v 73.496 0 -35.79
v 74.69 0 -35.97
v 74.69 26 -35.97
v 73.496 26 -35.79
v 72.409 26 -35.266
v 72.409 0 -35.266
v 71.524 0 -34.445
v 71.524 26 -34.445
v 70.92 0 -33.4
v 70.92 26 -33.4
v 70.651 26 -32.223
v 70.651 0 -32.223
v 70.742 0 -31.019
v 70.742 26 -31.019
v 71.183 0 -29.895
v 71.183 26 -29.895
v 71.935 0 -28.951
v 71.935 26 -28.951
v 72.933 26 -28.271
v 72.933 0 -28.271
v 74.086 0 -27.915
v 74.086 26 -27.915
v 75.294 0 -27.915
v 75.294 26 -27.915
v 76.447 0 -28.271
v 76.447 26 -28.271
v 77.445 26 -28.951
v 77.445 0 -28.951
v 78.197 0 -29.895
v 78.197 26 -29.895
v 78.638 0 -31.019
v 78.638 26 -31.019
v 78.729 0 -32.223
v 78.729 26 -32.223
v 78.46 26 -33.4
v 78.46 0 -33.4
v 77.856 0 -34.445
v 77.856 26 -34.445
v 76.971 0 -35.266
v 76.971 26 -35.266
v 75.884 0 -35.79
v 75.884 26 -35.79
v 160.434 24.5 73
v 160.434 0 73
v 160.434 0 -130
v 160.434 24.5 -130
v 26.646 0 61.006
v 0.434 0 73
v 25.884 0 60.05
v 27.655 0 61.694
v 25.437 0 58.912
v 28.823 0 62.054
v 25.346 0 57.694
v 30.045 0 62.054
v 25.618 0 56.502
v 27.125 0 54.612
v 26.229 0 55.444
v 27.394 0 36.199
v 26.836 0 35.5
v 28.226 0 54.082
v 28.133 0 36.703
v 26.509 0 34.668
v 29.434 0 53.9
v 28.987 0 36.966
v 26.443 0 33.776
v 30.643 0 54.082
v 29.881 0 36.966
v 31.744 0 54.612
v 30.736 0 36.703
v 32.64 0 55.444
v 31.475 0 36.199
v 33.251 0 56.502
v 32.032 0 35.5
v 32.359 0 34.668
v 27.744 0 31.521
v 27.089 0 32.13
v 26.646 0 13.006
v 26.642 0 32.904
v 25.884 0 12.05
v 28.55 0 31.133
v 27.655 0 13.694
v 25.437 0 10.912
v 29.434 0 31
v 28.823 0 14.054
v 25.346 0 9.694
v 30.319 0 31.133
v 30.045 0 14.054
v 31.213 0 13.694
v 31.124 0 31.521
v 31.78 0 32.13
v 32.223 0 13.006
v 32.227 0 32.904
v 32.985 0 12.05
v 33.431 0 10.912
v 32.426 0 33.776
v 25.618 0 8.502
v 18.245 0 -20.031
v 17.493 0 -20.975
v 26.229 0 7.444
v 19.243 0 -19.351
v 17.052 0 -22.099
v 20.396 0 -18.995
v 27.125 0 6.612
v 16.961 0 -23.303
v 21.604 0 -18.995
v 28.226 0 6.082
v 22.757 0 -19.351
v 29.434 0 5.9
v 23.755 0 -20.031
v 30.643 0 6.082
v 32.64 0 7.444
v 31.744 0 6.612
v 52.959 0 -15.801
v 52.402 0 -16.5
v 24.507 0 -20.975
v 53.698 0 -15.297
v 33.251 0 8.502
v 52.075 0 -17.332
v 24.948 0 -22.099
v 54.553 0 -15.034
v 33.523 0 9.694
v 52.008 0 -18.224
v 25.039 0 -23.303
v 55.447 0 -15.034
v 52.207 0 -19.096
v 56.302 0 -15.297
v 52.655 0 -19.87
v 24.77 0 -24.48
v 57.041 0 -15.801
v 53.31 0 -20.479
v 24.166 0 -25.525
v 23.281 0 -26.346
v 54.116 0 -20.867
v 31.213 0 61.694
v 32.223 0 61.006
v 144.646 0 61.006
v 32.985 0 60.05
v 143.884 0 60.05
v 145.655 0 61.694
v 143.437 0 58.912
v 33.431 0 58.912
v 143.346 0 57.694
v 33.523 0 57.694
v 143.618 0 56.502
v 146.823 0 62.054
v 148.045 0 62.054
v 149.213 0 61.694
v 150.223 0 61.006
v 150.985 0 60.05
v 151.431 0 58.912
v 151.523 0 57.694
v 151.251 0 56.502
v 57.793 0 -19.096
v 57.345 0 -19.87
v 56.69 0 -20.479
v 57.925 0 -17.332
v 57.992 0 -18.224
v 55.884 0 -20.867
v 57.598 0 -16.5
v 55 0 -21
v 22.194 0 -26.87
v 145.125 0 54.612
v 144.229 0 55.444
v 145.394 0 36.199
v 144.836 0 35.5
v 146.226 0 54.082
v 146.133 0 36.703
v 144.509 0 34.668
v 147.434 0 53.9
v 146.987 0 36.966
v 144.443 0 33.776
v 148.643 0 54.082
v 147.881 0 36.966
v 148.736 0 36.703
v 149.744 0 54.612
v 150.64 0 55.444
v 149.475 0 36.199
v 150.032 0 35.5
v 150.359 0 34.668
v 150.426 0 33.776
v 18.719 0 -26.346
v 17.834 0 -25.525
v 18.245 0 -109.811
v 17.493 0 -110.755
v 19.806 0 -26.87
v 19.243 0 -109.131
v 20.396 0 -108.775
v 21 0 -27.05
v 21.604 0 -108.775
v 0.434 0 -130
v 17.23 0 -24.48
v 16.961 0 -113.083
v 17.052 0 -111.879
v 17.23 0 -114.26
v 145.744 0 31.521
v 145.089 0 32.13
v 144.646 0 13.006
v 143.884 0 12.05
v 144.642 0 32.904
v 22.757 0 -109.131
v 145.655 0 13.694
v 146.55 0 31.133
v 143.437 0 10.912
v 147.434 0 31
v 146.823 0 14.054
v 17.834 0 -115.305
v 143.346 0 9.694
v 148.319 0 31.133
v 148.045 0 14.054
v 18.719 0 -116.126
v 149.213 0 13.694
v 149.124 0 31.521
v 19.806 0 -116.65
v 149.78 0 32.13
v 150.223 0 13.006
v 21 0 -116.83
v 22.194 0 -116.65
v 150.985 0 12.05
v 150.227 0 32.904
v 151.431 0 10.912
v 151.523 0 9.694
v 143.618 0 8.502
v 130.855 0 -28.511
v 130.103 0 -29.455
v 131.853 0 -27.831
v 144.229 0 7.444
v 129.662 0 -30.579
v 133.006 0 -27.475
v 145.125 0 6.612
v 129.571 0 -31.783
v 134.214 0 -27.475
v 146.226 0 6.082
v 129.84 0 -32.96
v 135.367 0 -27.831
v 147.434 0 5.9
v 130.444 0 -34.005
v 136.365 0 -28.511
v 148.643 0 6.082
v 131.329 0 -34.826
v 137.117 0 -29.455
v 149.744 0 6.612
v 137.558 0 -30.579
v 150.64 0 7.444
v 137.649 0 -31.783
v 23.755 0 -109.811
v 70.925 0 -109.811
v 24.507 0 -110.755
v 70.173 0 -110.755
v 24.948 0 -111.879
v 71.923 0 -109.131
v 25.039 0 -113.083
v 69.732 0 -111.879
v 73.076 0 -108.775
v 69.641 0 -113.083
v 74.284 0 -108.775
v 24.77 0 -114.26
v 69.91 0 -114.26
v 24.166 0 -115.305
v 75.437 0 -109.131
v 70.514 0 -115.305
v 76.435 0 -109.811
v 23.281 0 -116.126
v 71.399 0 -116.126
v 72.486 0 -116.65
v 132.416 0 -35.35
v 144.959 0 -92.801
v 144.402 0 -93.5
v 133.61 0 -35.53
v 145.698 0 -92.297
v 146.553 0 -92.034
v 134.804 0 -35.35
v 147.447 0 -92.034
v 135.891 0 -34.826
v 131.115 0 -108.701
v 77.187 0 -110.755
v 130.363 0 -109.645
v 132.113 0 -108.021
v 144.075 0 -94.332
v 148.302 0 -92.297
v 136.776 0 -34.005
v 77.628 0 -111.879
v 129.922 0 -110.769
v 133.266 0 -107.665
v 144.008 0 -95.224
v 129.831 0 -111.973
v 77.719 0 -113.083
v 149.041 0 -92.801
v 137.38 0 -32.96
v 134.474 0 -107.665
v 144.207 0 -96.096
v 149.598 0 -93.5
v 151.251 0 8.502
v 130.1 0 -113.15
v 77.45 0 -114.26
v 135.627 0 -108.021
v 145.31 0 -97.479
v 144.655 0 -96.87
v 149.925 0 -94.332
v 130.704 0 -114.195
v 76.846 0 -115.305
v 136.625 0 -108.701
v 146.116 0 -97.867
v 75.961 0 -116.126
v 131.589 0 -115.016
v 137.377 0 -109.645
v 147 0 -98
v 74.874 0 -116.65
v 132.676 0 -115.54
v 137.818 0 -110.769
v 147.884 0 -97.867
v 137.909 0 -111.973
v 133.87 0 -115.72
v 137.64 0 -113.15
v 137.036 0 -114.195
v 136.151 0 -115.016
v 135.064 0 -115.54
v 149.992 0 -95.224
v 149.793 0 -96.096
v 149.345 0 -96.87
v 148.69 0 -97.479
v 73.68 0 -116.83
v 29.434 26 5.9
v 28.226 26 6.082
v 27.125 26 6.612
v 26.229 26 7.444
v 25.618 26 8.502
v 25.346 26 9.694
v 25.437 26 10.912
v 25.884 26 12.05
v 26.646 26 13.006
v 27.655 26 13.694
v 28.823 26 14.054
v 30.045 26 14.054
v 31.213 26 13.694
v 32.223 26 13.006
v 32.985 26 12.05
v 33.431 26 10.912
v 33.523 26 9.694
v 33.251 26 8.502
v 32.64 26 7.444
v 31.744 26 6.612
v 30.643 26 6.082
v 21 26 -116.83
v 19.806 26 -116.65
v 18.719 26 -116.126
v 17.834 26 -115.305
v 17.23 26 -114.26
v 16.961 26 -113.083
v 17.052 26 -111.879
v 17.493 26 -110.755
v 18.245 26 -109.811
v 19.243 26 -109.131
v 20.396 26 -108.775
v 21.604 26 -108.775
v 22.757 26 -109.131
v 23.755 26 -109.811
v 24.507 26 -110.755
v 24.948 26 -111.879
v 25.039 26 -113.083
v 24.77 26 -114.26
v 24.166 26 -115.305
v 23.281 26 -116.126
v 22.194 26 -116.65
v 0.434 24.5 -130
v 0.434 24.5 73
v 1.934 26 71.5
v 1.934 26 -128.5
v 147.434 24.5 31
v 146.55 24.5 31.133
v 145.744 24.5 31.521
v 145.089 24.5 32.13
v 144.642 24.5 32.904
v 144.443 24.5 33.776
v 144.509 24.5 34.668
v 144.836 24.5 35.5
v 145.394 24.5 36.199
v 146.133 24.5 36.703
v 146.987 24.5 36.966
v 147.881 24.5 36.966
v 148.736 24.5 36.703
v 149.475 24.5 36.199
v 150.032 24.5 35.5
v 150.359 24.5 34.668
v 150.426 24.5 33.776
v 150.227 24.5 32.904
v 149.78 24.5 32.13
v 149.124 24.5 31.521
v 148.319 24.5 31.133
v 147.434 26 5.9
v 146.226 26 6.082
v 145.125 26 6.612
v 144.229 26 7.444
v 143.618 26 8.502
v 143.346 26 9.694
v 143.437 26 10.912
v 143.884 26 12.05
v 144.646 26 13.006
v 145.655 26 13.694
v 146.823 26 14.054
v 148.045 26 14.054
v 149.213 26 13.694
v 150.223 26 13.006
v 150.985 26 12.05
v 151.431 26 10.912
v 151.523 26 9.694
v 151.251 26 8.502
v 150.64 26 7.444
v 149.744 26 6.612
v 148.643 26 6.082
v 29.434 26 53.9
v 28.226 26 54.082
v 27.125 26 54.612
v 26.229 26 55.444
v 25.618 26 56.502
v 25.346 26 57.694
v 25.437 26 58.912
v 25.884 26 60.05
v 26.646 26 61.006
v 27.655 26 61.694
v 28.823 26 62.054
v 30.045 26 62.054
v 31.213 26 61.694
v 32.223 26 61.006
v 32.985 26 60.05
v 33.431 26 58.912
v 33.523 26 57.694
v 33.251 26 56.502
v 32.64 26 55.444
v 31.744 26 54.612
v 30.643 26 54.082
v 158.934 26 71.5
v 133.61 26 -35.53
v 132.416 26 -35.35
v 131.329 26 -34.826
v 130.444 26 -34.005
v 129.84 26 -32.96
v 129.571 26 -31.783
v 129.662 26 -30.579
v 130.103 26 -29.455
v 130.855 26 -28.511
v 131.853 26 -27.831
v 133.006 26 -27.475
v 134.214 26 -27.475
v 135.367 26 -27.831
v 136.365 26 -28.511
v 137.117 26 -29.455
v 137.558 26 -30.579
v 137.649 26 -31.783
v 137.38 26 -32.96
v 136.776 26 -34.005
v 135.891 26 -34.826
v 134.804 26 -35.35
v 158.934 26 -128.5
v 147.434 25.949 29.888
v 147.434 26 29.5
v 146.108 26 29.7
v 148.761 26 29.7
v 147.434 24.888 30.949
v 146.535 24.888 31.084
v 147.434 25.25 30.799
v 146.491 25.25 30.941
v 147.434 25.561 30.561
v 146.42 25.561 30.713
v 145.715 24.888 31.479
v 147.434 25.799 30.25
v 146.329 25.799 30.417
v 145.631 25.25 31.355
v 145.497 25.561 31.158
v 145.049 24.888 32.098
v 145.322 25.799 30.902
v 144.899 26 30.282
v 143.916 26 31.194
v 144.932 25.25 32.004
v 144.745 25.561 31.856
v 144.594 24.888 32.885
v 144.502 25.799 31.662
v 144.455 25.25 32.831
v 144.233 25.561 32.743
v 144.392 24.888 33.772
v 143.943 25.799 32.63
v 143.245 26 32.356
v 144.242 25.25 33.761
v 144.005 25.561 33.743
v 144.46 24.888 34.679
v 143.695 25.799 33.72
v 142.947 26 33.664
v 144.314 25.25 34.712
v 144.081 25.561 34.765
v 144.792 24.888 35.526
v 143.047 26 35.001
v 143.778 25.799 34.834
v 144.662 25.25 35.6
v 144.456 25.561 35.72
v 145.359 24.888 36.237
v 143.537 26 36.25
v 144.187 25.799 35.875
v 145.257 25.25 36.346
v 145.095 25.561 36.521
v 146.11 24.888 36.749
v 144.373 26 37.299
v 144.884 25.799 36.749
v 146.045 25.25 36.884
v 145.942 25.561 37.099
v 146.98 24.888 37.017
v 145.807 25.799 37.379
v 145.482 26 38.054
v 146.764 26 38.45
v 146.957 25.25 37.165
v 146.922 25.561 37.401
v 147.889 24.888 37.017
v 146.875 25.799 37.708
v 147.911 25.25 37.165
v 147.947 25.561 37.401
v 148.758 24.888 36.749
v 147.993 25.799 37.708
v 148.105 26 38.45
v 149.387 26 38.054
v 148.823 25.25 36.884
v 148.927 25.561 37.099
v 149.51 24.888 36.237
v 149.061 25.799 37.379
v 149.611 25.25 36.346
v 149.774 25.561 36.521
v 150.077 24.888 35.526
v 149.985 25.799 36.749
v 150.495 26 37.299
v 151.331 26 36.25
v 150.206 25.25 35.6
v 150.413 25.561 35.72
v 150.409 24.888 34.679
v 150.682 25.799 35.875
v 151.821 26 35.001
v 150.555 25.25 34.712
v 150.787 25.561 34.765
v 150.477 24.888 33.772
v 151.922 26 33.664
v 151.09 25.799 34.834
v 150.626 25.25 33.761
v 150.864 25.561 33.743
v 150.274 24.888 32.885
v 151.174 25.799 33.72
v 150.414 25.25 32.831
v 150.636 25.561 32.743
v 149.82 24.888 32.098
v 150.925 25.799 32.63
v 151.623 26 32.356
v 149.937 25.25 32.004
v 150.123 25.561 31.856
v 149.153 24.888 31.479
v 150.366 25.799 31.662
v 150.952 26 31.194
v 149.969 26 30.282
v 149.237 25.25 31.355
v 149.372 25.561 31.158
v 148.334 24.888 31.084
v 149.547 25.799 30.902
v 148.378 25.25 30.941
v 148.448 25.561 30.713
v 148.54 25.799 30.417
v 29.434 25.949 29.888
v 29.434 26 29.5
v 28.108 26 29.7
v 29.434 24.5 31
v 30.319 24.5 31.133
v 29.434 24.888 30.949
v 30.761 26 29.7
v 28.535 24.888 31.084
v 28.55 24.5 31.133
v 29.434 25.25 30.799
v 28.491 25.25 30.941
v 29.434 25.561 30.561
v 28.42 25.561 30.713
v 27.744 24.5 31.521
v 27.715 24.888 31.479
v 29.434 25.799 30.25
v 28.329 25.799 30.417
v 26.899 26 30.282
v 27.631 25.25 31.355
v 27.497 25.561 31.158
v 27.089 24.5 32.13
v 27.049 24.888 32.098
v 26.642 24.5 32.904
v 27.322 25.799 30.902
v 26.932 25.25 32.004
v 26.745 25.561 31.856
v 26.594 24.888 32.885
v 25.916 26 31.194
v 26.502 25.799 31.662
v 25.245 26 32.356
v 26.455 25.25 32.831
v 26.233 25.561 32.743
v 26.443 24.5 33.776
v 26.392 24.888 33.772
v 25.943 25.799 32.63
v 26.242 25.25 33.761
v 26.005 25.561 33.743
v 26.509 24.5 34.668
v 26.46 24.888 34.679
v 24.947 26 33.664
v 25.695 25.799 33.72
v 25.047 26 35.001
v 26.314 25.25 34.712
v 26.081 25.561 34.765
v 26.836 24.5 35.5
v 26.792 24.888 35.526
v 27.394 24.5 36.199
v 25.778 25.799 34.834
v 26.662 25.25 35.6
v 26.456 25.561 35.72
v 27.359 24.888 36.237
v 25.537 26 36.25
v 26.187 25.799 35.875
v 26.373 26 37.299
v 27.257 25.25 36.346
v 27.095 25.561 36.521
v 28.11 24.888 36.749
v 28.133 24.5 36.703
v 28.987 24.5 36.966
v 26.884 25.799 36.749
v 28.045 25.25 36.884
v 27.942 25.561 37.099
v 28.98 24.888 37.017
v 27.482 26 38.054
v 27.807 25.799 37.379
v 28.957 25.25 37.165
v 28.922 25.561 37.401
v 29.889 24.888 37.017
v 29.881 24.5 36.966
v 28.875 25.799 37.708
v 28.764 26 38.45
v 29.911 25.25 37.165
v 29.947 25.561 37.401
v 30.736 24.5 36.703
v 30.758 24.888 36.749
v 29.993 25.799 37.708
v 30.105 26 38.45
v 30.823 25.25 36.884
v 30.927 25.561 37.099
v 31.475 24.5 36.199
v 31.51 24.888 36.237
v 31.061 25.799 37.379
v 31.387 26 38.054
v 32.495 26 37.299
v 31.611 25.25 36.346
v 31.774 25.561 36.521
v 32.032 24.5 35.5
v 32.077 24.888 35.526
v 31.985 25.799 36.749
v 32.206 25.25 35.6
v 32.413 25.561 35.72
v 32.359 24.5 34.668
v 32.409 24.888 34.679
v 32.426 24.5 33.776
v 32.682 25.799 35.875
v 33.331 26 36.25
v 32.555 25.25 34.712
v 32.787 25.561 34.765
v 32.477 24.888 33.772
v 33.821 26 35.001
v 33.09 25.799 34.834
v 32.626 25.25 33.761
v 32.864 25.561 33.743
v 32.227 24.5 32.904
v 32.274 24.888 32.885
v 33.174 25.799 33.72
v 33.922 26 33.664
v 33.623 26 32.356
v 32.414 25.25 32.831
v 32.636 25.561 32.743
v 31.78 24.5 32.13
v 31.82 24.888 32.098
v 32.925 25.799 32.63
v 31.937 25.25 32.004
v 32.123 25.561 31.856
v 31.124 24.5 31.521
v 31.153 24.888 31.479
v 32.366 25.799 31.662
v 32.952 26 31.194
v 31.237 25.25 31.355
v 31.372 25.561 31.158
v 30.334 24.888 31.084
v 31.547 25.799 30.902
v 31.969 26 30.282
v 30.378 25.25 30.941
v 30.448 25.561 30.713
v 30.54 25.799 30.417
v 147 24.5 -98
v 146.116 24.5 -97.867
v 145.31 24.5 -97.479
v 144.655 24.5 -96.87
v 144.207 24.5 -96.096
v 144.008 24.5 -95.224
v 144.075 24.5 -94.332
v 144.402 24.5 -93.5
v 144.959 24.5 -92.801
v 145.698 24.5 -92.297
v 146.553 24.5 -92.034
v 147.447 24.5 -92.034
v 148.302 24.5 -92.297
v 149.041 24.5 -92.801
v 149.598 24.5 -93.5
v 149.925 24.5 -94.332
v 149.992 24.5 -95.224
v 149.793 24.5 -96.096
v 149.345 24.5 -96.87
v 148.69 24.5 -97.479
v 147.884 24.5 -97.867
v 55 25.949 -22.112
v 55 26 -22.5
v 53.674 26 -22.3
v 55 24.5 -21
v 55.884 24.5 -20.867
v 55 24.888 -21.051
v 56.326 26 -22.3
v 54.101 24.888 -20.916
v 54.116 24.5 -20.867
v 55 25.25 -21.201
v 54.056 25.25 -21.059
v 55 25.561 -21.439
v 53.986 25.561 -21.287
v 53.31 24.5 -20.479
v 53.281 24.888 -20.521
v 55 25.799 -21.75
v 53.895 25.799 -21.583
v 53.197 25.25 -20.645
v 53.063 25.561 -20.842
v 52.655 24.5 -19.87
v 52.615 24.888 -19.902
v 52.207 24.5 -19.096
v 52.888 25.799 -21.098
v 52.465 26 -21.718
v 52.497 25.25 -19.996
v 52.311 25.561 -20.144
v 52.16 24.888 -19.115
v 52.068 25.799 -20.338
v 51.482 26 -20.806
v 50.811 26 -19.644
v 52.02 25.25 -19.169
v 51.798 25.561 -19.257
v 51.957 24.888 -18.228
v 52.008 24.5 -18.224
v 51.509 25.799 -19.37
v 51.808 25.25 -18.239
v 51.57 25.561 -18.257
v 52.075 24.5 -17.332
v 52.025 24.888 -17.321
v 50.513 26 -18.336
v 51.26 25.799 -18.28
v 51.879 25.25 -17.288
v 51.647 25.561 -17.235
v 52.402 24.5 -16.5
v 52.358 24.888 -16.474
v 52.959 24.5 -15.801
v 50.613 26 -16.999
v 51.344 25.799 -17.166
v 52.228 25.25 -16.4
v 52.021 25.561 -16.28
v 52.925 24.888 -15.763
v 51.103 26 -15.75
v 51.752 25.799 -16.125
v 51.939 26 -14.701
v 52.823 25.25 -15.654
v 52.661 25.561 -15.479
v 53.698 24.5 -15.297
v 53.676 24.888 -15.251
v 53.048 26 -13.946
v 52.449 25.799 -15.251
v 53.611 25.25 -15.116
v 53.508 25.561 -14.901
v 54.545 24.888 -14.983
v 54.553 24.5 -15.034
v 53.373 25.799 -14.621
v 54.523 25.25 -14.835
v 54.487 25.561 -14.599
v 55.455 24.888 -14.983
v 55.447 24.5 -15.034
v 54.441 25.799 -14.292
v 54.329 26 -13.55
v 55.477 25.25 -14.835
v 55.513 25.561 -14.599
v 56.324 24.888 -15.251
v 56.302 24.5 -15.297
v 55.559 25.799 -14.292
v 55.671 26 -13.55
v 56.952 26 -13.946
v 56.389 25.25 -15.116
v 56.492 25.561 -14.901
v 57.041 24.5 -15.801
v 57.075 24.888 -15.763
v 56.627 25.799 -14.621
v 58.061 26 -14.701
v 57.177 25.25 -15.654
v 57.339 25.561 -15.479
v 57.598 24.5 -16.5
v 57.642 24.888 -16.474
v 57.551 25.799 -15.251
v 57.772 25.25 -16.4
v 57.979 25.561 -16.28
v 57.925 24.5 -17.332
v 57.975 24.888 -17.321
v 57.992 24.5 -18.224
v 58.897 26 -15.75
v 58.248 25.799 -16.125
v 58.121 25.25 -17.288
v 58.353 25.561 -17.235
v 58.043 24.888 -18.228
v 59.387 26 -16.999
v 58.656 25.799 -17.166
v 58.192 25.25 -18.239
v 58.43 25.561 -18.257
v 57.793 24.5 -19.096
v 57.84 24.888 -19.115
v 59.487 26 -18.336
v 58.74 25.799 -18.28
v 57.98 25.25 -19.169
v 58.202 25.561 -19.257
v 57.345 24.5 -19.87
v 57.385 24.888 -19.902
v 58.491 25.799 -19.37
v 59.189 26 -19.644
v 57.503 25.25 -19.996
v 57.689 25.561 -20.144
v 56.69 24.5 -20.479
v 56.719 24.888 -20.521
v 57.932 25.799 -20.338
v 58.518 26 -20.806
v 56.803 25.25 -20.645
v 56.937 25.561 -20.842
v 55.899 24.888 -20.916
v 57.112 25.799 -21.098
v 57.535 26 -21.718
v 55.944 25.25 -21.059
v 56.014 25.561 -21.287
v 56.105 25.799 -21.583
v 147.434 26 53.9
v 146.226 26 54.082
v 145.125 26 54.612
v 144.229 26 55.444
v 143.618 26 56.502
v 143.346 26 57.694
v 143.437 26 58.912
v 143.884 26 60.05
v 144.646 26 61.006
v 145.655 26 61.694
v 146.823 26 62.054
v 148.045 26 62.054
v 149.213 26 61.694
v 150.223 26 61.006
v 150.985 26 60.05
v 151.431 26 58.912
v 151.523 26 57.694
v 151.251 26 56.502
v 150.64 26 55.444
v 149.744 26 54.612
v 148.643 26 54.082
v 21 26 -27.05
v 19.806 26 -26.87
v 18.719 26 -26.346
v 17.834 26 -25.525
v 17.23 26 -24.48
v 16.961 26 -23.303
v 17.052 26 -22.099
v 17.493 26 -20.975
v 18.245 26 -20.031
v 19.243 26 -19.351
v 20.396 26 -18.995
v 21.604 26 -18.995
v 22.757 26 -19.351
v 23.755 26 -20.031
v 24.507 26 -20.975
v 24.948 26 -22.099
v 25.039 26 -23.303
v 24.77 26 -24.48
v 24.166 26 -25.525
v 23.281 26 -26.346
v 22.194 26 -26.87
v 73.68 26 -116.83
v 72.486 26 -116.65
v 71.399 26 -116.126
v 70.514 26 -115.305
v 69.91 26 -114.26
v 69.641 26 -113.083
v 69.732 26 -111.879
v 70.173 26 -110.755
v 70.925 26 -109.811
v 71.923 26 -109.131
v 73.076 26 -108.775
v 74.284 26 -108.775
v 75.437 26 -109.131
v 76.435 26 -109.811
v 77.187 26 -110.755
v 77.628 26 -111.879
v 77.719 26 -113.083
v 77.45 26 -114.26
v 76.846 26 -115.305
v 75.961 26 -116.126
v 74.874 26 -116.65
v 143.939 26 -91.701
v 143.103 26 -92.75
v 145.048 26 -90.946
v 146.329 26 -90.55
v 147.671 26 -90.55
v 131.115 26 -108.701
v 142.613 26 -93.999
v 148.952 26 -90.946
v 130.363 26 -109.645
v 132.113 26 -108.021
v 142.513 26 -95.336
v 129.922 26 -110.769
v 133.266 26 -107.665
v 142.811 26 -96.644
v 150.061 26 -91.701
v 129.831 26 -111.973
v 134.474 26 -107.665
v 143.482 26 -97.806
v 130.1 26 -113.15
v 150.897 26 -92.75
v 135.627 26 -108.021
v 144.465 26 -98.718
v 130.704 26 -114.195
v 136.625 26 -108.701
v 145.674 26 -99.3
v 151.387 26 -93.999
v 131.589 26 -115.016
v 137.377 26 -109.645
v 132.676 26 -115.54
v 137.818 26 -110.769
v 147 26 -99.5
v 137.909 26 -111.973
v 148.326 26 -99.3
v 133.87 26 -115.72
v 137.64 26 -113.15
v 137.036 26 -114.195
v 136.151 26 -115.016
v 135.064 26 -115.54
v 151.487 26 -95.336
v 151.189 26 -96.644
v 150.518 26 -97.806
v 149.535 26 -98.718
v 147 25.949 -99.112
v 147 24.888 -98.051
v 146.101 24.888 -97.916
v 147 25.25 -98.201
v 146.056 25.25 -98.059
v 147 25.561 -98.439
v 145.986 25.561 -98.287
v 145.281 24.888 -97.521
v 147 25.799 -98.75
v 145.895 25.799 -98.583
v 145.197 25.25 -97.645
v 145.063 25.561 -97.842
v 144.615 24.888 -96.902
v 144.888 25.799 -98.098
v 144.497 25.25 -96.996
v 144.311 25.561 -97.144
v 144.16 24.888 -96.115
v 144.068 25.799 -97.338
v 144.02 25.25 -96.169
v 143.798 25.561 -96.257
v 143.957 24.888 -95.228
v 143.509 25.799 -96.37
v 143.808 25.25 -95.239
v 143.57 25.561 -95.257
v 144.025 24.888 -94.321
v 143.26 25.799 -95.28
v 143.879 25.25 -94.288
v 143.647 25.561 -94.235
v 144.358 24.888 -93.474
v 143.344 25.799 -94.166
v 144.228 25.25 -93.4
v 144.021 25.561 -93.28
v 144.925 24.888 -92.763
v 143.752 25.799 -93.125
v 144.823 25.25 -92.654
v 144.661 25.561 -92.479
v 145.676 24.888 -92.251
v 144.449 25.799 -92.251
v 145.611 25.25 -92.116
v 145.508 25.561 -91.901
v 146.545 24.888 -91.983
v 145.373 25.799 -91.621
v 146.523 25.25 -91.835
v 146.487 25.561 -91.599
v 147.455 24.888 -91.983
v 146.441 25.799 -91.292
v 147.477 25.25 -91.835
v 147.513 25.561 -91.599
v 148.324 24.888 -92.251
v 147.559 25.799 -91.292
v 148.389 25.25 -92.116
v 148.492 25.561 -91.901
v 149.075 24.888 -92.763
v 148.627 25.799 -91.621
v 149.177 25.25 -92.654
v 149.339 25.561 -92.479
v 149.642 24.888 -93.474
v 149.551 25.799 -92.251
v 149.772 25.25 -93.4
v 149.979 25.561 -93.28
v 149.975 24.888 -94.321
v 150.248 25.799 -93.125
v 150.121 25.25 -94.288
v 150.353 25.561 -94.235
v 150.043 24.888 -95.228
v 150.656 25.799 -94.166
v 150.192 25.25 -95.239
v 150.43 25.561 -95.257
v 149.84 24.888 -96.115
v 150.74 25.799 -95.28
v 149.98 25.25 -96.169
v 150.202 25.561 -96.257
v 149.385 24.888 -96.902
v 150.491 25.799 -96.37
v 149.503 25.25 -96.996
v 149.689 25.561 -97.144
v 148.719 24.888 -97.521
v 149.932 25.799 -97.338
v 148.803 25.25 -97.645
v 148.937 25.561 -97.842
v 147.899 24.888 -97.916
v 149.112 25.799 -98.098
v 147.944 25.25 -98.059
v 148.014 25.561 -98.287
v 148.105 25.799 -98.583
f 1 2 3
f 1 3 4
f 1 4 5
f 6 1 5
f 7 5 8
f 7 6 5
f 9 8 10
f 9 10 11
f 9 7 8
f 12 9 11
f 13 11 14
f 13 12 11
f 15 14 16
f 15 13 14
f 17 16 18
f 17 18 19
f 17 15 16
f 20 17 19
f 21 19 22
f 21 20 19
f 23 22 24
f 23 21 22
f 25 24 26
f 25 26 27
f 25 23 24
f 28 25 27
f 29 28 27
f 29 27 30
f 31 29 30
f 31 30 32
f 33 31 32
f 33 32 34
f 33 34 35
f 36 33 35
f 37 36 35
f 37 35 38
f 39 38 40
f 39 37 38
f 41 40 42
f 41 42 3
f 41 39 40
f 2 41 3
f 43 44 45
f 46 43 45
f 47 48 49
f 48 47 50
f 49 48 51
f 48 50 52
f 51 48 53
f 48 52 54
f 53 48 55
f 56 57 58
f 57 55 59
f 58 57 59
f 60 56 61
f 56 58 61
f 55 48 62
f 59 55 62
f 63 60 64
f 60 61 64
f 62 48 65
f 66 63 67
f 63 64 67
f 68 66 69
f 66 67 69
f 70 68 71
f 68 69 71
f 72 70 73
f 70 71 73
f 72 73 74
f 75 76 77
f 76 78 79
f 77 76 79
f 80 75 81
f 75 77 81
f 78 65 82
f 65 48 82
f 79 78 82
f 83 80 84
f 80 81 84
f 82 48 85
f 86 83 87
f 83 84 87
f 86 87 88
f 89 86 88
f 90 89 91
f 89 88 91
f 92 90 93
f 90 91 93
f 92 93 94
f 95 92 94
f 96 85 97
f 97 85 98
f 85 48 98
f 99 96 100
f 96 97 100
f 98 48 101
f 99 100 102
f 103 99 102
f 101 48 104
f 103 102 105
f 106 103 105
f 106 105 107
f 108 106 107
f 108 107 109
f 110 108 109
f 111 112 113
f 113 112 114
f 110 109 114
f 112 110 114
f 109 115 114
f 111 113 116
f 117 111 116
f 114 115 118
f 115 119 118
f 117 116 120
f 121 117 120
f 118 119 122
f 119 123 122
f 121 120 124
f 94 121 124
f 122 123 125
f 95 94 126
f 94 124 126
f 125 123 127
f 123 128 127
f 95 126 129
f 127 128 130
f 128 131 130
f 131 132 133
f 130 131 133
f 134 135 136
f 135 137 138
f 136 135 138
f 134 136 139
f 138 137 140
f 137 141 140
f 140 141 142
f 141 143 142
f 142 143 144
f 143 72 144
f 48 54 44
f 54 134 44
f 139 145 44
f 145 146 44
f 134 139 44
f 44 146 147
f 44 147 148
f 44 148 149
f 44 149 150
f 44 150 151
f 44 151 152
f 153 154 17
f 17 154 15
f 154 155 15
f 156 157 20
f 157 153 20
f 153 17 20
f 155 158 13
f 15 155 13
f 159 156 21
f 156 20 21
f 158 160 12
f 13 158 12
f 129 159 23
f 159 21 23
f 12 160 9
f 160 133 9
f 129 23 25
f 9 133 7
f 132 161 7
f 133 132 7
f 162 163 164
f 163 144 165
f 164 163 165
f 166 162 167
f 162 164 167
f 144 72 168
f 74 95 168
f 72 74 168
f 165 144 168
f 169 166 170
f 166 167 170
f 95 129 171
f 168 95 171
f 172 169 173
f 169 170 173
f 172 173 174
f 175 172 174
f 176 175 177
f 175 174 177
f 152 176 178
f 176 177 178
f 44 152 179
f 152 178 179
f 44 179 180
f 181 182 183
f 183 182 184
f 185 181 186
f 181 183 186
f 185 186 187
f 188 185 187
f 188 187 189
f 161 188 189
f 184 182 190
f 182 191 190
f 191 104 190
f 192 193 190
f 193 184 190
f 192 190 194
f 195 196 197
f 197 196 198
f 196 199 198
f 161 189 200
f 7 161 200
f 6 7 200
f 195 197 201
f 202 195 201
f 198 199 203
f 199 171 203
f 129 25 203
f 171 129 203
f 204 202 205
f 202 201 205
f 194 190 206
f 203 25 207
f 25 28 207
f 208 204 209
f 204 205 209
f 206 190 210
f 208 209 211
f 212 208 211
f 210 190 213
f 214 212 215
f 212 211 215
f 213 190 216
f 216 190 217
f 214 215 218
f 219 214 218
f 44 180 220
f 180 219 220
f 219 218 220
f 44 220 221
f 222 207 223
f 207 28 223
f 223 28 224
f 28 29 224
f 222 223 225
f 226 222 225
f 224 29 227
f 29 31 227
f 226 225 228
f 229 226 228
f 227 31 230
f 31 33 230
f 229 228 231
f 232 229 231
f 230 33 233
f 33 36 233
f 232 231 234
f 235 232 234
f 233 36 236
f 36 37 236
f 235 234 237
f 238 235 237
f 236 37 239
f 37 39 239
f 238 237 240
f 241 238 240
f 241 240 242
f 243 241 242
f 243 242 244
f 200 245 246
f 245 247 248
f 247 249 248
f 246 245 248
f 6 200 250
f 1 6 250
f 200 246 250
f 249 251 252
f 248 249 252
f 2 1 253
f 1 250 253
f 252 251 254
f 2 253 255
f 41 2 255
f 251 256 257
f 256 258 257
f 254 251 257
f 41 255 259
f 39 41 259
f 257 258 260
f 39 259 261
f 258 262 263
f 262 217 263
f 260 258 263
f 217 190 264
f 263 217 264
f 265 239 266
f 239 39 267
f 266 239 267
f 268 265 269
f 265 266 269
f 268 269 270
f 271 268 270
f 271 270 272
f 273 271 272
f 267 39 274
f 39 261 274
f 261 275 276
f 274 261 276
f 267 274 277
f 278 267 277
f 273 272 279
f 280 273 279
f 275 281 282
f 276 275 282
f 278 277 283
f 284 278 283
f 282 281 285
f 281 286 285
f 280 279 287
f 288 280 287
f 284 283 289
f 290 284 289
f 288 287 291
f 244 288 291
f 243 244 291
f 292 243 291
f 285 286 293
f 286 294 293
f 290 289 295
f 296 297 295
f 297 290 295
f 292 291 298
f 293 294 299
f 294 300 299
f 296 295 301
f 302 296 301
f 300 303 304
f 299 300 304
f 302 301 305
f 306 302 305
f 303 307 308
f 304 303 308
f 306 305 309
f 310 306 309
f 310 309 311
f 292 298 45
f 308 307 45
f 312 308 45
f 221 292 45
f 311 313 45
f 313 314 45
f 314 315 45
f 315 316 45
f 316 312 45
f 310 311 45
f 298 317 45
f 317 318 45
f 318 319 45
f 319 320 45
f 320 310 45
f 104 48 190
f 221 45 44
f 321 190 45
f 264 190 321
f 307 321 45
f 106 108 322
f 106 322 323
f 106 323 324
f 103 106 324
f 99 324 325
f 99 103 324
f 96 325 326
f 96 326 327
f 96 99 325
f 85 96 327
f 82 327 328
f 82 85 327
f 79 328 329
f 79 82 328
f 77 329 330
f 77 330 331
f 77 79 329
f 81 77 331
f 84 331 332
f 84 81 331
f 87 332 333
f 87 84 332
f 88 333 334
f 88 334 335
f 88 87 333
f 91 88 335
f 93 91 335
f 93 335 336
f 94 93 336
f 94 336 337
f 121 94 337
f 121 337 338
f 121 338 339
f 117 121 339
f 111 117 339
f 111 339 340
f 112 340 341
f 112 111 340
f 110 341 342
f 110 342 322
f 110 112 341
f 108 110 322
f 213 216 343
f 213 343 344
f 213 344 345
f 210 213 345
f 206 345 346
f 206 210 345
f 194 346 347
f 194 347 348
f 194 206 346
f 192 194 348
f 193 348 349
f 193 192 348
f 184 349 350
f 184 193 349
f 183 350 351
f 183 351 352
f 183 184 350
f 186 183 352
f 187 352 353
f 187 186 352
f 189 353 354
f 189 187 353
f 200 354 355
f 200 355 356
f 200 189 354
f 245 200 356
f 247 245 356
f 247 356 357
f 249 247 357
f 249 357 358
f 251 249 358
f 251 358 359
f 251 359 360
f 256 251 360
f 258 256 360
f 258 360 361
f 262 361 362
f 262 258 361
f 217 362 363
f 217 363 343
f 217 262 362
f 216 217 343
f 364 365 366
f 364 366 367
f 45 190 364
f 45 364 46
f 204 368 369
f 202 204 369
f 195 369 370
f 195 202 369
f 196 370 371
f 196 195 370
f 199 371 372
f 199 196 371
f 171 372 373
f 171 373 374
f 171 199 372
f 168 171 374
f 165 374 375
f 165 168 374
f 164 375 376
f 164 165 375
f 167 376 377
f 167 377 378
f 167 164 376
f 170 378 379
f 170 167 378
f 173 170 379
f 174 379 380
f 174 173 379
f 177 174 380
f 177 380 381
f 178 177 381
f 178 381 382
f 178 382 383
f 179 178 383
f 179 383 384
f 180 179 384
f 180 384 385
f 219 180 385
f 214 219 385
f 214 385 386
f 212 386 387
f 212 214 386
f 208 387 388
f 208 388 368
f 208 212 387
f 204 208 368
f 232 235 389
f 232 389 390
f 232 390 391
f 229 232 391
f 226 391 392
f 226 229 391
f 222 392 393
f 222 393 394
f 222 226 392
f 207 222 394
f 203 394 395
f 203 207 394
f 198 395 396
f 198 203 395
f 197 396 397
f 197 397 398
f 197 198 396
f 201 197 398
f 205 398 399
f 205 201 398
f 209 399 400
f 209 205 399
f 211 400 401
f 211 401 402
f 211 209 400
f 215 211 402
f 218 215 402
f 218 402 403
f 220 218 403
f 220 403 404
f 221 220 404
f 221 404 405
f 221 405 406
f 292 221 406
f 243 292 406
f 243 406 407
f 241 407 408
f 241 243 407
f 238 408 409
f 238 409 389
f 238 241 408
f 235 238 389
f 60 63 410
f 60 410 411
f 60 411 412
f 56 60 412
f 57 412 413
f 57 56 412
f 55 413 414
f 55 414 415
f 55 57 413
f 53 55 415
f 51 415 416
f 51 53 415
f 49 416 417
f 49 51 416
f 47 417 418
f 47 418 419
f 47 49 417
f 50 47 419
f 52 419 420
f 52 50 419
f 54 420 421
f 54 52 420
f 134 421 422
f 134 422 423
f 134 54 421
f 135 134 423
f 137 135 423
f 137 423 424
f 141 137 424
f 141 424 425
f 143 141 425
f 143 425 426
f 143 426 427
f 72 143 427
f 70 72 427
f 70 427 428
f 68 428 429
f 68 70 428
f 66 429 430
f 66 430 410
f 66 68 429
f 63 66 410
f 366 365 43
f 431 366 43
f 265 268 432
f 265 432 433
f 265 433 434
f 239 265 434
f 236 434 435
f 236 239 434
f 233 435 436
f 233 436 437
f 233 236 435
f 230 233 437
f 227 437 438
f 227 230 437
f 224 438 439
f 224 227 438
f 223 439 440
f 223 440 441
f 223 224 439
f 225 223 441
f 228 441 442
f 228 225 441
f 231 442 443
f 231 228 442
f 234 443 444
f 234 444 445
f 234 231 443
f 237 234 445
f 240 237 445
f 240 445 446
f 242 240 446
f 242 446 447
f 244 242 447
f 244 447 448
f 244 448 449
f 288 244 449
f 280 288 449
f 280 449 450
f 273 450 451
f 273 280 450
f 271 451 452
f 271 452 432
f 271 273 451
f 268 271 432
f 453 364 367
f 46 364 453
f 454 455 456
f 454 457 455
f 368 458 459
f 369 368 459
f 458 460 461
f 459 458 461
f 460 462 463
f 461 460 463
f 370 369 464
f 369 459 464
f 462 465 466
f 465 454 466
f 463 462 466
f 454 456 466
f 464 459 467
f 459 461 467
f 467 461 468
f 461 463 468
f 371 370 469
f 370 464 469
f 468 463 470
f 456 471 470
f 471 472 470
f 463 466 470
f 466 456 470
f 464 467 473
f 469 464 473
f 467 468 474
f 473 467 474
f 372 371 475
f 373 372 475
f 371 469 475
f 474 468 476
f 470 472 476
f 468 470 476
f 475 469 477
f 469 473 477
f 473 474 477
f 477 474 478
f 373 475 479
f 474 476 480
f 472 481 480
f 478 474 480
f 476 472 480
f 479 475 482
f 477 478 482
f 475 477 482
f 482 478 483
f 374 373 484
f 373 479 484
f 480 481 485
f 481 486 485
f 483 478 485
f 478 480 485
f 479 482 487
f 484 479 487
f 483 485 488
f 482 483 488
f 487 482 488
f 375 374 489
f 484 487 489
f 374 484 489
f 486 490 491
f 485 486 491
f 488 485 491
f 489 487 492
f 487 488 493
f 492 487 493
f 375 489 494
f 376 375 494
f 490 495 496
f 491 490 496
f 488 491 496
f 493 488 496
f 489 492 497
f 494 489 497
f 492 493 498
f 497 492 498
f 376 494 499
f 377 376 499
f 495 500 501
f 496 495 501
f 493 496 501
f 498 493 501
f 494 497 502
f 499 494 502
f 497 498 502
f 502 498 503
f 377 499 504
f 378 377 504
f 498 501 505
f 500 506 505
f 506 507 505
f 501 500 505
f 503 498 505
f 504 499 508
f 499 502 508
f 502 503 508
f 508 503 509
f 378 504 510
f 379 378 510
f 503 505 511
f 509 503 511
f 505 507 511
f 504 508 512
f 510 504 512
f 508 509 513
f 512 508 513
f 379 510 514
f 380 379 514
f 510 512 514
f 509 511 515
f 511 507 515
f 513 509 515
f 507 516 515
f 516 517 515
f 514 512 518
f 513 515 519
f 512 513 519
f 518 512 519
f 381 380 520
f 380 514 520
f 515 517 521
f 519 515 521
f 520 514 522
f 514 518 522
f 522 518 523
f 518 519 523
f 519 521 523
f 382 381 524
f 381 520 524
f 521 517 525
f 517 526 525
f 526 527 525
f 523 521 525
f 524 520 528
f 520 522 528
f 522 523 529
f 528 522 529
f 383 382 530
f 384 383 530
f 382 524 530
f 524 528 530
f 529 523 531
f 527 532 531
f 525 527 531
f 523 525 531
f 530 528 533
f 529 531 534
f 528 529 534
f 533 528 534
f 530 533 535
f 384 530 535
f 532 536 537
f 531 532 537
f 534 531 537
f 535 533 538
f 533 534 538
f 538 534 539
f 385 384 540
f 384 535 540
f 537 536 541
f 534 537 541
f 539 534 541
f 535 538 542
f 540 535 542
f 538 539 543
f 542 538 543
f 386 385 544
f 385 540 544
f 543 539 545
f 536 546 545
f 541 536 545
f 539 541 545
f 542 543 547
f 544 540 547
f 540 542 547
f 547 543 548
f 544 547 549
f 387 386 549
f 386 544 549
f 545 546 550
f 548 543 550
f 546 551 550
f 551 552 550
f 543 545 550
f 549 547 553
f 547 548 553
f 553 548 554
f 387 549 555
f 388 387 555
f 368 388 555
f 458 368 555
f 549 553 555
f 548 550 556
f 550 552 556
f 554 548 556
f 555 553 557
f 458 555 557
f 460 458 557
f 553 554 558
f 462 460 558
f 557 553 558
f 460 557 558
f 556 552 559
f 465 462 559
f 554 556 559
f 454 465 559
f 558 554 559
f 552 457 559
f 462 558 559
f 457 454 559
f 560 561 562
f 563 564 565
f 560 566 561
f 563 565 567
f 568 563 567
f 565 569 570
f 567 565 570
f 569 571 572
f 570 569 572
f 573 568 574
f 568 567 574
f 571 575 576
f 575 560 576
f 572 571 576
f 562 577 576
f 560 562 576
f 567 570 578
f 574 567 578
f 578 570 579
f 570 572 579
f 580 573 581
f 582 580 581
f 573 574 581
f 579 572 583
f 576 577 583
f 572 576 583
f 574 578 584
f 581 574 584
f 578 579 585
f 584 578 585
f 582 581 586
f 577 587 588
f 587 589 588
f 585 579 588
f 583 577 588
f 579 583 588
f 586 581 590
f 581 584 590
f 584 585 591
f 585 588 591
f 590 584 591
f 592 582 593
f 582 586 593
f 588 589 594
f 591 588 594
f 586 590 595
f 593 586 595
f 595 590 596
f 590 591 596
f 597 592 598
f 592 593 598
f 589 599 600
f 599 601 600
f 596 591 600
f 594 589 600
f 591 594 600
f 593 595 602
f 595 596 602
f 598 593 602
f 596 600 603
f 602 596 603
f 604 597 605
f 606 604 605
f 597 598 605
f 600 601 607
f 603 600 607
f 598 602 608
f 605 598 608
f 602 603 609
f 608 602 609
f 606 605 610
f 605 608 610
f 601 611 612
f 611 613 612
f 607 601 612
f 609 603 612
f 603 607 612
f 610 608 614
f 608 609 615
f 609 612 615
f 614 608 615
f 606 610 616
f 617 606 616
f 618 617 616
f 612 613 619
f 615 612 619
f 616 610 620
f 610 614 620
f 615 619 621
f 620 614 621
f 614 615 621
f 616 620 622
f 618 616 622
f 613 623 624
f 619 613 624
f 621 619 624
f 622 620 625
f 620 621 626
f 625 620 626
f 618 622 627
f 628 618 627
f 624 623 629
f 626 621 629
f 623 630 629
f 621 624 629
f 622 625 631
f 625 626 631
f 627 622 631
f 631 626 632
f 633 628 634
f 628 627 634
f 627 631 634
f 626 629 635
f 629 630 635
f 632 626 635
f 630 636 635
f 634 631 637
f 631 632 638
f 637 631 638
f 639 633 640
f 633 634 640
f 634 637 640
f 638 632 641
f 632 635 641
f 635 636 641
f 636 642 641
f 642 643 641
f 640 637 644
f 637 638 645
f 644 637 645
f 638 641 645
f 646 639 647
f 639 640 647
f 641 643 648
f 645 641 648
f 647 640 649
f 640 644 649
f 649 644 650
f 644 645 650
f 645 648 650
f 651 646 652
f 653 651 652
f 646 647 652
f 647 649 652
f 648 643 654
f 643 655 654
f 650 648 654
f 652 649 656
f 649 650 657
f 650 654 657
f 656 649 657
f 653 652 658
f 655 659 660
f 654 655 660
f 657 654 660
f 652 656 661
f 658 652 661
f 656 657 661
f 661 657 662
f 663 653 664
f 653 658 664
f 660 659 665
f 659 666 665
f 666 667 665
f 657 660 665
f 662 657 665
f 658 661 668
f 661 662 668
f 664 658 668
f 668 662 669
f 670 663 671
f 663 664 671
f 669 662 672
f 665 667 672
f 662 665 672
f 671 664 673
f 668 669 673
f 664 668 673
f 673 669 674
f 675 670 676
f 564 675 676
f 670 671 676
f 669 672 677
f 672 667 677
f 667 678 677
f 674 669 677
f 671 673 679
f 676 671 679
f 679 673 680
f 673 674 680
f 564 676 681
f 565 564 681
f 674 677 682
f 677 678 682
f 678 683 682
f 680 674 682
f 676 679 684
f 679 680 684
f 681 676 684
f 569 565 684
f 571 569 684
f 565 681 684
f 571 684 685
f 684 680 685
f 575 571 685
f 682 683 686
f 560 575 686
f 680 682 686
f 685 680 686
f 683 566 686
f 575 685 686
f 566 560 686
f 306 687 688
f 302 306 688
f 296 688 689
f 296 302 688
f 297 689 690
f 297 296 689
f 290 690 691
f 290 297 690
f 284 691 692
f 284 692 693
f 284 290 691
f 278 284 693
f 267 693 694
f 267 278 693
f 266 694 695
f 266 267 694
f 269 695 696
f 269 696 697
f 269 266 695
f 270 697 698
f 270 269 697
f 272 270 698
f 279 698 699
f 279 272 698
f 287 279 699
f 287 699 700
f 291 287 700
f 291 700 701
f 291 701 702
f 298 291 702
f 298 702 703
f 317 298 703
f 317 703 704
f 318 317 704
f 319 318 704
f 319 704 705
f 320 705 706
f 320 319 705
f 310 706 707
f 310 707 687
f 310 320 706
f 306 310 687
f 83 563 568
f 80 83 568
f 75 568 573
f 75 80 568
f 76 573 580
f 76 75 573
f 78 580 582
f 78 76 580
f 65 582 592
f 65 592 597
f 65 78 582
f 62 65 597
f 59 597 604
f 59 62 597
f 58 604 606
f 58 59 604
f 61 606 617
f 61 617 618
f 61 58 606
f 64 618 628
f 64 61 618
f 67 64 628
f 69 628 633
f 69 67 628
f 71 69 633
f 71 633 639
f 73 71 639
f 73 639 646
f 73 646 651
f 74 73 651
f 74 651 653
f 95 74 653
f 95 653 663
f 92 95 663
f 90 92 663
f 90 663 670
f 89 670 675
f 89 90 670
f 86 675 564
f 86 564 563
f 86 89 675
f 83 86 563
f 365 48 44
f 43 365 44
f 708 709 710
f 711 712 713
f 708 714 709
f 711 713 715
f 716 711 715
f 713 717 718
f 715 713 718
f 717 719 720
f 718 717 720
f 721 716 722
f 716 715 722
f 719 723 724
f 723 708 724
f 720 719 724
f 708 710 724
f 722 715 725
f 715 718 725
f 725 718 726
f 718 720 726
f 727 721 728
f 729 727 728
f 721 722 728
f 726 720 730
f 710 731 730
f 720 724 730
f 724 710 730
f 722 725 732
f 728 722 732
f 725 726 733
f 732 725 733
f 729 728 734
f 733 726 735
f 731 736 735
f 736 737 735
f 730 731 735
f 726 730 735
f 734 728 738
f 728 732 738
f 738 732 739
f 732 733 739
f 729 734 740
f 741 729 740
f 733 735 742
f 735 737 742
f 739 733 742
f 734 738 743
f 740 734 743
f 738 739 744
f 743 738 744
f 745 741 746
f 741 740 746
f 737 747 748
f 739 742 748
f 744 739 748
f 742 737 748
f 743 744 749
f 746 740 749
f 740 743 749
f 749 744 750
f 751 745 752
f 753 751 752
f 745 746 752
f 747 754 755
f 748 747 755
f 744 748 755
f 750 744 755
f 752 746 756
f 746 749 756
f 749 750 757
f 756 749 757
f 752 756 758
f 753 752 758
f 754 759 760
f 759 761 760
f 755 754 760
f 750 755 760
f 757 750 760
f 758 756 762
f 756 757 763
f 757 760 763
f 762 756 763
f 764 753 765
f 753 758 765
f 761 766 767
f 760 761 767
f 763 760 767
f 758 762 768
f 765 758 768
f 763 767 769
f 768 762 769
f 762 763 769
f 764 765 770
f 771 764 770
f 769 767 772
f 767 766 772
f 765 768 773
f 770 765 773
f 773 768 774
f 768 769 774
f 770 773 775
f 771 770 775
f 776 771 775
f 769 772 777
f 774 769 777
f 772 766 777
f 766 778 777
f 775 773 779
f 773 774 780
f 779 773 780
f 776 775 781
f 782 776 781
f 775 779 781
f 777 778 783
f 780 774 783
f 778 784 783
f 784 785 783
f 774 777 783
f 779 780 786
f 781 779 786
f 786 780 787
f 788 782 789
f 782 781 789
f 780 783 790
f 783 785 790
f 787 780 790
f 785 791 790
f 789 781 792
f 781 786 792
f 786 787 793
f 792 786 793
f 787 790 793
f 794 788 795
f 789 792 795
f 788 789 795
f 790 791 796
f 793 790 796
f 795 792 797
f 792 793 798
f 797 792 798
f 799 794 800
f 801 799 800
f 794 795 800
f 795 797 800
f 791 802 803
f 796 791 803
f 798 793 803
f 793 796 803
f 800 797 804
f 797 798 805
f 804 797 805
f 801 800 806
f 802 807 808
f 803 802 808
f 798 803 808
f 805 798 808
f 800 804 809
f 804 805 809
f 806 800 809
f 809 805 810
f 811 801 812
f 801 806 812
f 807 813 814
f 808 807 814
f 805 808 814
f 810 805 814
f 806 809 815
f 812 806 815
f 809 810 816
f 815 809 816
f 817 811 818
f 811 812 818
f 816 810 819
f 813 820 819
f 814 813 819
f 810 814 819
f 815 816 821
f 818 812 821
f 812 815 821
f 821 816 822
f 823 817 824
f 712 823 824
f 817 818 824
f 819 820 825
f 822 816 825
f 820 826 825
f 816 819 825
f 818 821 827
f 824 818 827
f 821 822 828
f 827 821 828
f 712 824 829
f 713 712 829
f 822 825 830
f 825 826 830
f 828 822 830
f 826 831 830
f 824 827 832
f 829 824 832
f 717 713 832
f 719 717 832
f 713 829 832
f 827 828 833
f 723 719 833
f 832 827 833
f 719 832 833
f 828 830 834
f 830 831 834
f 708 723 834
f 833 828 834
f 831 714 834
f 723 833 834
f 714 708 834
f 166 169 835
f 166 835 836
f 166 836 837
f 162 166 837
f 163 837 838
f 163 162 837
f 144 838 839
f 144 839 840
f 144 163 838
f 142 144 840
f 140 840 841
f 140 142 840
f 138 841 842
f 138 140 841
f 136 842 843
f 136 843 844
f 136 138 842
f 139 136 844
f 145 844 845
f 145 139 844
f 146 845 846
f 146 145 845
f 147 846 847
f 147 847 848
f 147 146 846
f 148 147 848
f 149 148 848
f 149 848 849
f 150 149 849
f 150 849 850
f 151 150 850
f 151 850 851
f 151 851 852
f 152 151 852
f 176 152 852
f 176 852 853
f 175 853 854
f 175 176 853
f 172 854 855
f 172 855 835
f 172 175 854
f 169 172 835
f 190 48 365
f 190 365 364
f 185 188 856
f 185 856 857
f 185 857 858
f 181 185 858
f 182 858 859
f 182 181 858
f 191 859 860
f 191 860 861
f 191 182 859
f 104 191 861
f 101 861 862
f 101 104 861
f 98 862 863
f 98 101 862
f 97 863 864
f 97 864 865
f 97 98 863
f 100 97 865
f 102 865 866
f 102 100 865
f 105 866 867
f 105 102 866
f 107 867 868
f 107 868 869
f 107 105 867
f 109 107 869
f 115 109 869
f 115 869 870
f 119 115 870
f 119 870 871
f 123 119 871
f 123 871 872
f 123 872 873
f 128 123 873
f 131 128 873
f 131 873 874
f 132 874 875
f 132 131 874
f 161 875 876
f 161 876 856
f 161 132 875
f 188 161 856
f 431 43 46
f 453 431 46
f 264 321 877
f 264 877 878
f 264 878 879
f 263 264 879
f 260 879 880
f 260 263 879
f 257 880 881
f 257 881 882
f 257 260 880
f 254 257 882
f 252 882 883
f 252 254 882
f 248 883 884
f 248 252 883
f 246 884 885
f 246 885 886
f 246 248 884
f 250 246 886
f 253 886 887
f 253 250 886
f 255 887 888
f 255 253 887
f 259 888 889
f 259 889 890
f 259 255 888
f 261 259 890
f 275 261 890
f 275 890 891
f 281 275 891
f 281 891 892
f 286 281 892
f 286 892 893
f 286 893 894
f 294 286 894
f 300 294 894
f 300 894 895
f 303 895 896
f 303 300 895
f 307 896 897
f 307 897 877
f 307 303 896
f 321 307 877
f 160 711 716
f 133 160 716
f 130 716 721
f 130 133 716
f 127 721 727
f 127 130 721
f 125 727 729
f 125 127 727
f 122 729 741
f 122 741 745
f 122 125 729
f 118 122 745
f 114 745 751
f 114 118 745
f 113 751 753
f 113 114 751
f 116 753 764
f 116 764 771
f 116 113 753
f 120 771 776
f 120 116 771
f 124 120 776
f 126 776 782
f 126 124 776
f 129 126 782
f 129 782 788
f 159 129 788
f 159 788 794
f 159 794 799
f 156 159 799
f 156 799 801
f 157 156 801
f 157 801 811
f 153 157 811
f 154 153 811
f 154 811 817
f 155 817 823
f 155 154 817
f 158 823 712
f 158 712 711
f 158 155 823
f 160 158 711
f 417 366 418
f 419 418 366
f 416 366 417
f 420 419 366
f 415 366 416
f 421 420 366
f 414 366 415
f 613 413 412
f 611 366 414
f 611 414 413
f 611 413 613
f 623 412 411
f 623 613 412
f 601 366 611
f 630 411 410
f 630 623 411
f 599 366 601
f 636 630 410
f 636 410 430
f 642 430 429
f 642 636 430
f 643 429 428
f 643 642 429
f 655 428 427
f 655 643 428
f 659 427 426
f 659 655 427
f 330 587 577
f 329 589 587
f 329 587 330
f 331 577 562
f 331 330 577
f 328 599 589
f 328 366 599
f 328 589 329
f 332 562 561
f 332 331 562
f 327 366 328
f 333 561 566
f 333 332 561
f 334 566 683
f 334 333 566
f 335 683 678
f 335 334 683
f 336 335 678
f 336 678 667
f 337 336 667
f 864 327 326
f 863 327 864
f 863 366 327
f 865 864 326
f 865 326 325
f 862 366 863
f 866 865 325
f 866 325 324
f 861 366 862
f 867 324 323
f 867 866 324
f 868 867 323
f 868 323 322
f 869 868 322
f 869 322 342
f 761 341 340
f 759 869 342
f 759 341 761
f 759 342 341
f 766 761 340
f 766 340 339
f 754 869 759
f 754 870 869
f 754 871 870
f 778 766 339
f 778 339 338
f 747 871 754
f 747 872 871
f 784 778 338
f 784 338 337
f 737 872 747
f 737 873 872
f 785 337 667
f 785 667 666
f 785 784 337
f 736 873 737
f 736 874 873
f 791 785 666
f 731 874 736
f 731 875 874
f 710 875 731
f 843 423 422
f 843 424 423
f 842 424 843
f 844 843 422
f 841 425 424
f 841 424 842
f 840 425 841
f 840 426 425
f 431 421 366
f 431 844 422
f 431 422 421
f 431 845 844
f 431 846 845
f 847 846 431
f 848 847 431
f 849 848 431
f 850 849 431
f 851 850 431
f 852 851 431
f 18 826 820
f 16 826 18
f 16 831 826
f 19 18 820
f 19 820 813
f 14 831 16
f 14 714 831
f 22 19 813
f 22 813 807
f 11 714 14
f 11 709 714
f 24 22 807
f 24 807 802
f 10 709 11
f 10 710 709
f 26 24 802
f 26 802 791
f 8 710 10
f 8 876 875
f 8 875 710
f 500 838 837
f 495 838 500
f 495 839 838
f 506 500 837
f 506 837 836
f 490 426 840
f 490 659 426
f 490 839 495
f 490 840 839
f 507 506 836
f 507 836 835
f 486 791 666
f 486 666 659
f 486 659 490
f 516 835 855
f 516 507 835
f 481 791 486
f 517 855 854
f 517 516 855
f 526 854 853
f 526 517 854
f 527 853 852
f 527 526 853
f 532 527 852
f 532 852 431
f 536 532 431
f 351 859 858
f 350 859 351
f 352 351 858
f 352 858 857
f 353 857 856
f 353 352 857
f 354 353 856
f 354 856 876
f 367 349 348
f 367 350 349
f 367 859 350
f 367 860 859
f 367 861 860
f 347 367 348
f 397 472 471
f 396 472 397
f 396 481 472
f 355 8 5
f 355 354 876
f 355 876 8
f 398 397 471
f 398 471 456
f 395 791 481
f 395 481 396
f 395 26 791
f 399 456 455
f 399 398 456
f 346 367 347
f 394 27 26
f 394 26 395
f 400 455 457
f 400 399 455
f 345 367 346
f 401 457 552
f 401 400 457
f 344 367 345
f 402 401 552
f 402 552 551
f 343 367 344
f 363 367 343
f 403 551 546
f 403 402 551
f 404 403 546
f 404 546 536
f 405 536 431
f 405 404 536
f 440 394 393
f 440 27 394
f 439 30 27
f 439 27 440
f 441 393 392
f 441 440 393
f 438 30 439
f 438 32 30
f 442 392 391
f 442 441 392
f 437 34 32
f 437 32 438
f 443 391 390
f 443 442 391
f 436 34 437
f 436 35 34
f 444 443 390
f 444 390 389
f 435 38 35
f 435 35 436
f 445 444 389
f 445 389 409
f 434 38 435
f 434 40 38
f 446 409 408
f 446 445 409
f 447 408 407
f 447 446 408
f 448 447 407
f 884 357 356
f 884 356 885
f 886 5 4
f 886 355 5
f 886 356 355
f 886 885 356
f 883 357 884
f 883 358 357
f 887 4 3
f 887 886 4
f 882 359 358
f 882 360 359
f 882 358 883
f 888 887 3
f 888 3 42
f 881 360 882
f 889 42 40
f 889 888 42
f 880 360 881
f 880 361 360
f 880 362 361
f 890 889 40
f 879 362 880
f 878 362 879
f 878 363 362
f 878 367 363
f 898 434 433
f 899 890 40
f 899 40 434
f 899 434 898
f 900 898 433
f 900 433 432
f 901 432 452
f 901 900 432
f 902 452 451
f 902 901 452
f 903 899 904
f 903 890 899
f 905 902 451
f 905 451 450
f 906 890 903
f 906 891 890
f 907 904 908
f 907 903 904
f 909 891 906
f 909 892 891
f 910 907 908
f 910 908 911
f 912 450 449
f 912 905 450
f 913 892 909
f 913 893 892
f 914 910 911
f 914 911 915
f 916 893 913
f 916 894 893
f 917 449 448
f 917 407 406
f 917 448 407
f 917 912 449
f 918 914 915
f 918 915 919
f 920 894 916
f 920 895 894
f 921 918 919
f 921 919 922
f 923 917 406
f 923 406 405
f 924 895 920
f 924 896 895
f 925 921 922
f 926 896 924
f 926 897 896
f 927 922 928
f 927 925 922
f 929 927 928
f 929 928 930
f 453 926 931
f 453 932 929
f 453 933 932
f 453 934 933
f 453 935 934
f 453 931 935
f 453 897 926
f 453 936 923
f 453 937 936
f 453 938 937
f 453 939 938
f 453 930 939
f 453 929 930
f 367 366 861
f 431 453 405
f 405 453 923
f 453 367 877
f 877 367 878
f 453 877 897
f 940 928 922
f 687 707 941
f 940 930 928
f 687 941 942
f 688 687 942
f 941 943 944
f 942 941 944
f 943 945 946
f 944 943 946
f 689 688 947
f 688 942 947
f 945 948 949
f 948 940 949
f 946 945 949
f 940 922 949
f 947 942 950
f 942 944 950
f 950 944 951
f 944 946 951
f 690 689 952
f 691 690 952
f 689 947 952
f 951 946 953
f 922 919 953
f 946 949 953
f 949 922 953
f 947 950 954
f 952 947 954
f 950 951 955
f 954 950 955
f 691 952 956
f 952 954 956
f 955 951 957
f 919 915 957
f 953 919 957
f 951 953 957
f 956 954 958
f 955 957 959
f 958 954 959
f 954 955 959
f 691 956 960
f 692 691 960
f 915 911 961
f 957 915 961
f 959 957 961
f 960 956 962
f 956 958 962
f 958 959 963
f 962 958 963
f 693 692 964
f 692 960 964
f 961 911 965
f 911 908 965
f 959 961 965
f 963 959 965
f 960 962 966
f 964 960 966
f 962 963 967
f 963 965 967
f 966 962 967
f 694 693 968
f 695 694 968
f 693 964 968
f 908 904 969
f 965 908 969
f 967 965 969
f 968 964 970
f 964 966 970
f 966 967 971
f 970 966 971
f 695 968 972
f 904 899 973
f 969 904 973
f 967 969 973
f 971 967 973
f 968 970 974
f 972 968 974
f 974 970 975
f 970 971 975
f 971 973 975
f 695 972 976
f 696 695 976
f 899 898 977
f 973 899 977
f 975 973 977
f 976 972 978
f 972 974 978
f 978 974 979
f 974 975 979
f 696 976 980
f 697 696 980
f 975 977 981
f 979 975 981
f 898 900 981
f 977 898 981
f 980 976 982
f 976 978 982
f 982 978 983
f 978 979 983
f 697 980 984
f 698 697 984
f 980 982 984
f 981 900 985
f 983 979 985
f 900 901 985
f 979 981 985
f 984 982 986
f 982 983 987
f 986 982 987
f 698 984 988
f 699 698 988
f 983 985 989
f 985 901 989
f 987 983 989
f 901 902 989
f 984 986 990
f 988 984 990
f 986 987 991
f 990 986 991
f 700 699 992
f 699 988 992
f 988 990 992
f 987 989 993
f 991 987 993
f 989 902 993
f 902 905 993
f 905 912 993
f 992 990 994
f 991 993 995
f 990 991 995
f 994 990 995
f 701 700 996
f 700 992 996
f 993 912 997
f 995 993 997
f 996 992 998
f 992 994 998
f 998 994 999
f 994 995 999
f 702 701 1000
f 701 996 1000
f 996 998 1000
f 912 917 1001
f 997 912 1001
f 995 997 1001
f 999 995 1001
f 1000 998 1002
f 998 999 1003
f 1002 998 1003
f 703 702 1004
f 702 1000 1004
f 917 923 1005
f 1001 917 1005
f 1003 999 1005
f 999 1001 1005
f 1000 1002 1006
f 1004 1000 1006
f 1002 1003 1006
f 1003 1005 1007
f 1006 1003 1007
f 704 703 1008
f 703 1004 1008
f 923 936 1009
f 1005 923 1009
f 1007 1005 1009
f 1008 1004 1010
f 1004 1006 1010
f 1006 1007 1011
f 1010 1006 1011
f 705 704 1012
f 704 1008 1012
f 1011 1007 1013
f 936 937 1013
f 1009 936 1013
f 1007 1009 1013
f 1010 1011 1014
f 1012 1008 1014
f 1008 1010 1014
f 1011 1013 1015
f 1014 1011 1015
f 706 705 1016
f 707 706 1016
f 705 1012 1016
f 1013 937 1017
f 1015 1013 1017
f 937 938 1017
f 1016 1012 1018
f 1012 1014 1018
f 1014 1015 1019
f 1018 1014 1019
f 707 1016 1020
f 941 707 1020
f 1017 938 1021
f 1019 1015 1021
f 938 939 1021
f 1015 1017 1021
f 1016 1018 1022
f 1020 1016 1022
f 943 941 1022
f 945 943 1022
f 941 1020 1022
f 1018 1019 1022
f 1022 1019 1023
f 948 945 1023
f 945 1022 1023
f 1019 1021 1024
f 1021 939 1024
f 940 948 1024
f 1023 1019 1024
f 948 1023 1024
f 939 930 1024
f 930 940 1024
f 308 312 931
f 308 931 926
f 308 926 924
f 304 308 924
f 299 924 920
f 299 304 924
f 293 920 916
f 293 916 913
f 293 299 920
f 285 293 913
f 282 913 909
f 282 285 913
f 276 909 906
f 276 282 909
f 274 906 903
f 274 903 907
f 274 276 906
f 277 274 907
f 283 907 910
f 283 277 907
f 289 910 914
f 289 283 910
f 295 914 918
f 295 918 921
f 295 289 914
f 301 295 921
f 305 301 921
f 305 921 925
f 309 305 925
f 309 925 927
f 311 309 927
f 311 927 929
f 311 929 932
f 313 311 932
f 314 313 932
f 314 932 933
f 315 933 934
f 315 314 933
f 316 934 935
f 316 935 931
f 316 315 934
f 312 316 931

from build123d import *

# Parameters (mm, degrees)
SKETCH1_W           = 160
SKETCH1_H           = 203
SKETCH1_R           = 4.05
SKETCH1_R_2         = 4.1
SKETCH1_R_3         = 3
BOSS_EXTRUDE1_DEPTH = 26
FILLET1_R           = 1.5
CHAMFER1_SIZE       = 1.5


with BuildPart() as part:
    # Sketch1 → Boss-Extrude1 (new body)
    with BuildSketch(Plane(origin=(0, 0, 0), x_dir=(1, 0, 0), z_dir=(0, 1, 0))):
        with Locations((80.434245342, 28.5)):
            Rectangle(SKETCH1_W, SKETCH1_H)
        with Locations(Location((73.68, 112.78, 0), (0, 0, 90))):
            Circle(SKETCH1_R, mode=Mode.SUBTRACT)
        with Locations(Location((133.87, 111.67, 0), (0, 0, 90))):
            Circle(SKETCH1_R, mode=Mode.SUBTRACT)
        with Locations(Location((133.61, 31.48, 0), (0, 0, 90))):
            Circle(SKETCH1_R, mode=Mode.SUBTRACT)
        with Locations(Location((74.69, 31.92, 0), (0, 0, 90))):
            Circle(SKETCH1_R, mode=Mode.SUBTRACT)
        with Locations(Location((29.434245342, -10, 0), (0, 0, 90))):
            Circle(SKETCH1_R_2, mode=Mode.SUBTRACT)
        with Locations(Location((29.434245342, -58, 0), (0, 0, 90))):
            Circle(SKETCH1_R_2, mode=Mode.SUBTRACT)
        with Locations(Location((21, 112.78, 0), (0, 0, 90))):
            Circle(SKETCH1_R, mode=Mode.SUBTRACT)
        with Locations(Location((147.434245342, -58, 0), (0, 0, 90))):
            Circle(SKETCH1_R_2, mode=Mode.SUBTRACT)
        with Locations(Location((147.434245342, -10, 0), (0, 0, 90))):
            Circle(SKETCH1_R_2, mode=Mode.SUBTRACT)
        with Locations(Location((21, 23, 0), (0, 0, 90))):
            Circle(SKETCH1_R, mode=Mode.SUBTRACT)
        with Locations(Location((29.434245342, -34, 0), (0, 0, 90))):
            Circle(SKETCH1_R_3, mode=Mode.SUBTRACT)
        with Locations(Location((147.434245342, -34, 0), (0, 0, 90))):
            Circle(SKETCH1_R_3, mode=Mode.SUBTRACT)
        with Locations(Location((147, 95, 0), (0, 0, 90))):
            Circle(SKETCH1_R_3, mode=Mode.SUBTRACT)
        with Locations(Location((55, 18, 0), (0, 0, 90))):
            Circle(SKETCH1_R_3, mode=Mode.SUBTRACT)
    extrude(amount=BOSS_EXTRUDE1_DEPTH)

    # Fillet1
    fillet1_edges = [part.edges().sort_by_distance(p)[0] for p in [
        (29.434245342, 26, 37),
        (147.434245342, 26, 37),
        (147, 26, -92),
        (55, 26, -15),
    ]]
    fillet(fillet1_edges, radius=FILLET1_R)

    # Chamfer1
    chamfer1_edges = [part.edges().sort_by_distance(p)[0] for p in [
        (0.434245342, 26, -28.5),
        (80.434245342, 26, 73),
        (160.434245342, 26, -28.5),
        (80.434245342, 26, -130),
    ]]
    chamfer(chamfer1_edges, length=CHAMFER1_SIZE)


solid = part.part
